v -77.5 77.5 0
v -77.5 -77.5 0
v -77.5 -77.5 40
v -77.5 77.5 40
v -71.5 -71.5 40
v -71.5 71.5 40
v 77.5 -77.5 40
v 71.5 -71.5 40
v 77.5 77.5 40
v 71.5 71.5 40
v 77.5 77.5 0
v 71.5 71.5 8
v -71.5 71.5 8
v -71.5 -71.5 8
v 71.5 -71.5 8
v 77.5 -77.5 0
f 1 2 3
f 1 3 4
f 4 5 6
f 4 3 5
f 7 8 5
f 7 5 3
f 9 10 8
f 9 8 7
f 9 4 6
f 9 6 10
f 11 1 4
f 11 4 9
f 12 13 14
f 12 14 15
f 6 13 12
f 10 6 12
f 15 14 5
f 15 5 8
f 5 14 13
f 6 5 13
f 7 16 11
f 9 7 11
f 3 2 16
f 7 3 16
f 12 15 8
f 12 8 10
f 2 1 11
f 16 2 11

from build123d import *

# Parameters (mm, degrees)
F0_W     = 155
F0_H     = 155
F1_DEPTH = 40
F2_T     = -6
F3_DEPTH = 2


with BuildPart() as f1:
    # F0 (on Top) → F1 (new body)
    with BuildSketch(Plane.XY):
        Rectangle(F0_W, F0_H)
    extrude(amount=F1_DEPTH)

    # F2
    f2_openings = [f1.faces().sort_by_distance(p)[0] for p in [
        (0, 0, 40),
    ]]
    offset(amount=F2_T, openings=f2_openings)

    # F3 (add): a face of the model
    f3_faces = [f1.faces().sort_by_distance(p)[0] for p in [
        (0, 0, 6),
    ]]
    extrude(f3_faces, amount=F3_DEPTH)


solid = f1.part
